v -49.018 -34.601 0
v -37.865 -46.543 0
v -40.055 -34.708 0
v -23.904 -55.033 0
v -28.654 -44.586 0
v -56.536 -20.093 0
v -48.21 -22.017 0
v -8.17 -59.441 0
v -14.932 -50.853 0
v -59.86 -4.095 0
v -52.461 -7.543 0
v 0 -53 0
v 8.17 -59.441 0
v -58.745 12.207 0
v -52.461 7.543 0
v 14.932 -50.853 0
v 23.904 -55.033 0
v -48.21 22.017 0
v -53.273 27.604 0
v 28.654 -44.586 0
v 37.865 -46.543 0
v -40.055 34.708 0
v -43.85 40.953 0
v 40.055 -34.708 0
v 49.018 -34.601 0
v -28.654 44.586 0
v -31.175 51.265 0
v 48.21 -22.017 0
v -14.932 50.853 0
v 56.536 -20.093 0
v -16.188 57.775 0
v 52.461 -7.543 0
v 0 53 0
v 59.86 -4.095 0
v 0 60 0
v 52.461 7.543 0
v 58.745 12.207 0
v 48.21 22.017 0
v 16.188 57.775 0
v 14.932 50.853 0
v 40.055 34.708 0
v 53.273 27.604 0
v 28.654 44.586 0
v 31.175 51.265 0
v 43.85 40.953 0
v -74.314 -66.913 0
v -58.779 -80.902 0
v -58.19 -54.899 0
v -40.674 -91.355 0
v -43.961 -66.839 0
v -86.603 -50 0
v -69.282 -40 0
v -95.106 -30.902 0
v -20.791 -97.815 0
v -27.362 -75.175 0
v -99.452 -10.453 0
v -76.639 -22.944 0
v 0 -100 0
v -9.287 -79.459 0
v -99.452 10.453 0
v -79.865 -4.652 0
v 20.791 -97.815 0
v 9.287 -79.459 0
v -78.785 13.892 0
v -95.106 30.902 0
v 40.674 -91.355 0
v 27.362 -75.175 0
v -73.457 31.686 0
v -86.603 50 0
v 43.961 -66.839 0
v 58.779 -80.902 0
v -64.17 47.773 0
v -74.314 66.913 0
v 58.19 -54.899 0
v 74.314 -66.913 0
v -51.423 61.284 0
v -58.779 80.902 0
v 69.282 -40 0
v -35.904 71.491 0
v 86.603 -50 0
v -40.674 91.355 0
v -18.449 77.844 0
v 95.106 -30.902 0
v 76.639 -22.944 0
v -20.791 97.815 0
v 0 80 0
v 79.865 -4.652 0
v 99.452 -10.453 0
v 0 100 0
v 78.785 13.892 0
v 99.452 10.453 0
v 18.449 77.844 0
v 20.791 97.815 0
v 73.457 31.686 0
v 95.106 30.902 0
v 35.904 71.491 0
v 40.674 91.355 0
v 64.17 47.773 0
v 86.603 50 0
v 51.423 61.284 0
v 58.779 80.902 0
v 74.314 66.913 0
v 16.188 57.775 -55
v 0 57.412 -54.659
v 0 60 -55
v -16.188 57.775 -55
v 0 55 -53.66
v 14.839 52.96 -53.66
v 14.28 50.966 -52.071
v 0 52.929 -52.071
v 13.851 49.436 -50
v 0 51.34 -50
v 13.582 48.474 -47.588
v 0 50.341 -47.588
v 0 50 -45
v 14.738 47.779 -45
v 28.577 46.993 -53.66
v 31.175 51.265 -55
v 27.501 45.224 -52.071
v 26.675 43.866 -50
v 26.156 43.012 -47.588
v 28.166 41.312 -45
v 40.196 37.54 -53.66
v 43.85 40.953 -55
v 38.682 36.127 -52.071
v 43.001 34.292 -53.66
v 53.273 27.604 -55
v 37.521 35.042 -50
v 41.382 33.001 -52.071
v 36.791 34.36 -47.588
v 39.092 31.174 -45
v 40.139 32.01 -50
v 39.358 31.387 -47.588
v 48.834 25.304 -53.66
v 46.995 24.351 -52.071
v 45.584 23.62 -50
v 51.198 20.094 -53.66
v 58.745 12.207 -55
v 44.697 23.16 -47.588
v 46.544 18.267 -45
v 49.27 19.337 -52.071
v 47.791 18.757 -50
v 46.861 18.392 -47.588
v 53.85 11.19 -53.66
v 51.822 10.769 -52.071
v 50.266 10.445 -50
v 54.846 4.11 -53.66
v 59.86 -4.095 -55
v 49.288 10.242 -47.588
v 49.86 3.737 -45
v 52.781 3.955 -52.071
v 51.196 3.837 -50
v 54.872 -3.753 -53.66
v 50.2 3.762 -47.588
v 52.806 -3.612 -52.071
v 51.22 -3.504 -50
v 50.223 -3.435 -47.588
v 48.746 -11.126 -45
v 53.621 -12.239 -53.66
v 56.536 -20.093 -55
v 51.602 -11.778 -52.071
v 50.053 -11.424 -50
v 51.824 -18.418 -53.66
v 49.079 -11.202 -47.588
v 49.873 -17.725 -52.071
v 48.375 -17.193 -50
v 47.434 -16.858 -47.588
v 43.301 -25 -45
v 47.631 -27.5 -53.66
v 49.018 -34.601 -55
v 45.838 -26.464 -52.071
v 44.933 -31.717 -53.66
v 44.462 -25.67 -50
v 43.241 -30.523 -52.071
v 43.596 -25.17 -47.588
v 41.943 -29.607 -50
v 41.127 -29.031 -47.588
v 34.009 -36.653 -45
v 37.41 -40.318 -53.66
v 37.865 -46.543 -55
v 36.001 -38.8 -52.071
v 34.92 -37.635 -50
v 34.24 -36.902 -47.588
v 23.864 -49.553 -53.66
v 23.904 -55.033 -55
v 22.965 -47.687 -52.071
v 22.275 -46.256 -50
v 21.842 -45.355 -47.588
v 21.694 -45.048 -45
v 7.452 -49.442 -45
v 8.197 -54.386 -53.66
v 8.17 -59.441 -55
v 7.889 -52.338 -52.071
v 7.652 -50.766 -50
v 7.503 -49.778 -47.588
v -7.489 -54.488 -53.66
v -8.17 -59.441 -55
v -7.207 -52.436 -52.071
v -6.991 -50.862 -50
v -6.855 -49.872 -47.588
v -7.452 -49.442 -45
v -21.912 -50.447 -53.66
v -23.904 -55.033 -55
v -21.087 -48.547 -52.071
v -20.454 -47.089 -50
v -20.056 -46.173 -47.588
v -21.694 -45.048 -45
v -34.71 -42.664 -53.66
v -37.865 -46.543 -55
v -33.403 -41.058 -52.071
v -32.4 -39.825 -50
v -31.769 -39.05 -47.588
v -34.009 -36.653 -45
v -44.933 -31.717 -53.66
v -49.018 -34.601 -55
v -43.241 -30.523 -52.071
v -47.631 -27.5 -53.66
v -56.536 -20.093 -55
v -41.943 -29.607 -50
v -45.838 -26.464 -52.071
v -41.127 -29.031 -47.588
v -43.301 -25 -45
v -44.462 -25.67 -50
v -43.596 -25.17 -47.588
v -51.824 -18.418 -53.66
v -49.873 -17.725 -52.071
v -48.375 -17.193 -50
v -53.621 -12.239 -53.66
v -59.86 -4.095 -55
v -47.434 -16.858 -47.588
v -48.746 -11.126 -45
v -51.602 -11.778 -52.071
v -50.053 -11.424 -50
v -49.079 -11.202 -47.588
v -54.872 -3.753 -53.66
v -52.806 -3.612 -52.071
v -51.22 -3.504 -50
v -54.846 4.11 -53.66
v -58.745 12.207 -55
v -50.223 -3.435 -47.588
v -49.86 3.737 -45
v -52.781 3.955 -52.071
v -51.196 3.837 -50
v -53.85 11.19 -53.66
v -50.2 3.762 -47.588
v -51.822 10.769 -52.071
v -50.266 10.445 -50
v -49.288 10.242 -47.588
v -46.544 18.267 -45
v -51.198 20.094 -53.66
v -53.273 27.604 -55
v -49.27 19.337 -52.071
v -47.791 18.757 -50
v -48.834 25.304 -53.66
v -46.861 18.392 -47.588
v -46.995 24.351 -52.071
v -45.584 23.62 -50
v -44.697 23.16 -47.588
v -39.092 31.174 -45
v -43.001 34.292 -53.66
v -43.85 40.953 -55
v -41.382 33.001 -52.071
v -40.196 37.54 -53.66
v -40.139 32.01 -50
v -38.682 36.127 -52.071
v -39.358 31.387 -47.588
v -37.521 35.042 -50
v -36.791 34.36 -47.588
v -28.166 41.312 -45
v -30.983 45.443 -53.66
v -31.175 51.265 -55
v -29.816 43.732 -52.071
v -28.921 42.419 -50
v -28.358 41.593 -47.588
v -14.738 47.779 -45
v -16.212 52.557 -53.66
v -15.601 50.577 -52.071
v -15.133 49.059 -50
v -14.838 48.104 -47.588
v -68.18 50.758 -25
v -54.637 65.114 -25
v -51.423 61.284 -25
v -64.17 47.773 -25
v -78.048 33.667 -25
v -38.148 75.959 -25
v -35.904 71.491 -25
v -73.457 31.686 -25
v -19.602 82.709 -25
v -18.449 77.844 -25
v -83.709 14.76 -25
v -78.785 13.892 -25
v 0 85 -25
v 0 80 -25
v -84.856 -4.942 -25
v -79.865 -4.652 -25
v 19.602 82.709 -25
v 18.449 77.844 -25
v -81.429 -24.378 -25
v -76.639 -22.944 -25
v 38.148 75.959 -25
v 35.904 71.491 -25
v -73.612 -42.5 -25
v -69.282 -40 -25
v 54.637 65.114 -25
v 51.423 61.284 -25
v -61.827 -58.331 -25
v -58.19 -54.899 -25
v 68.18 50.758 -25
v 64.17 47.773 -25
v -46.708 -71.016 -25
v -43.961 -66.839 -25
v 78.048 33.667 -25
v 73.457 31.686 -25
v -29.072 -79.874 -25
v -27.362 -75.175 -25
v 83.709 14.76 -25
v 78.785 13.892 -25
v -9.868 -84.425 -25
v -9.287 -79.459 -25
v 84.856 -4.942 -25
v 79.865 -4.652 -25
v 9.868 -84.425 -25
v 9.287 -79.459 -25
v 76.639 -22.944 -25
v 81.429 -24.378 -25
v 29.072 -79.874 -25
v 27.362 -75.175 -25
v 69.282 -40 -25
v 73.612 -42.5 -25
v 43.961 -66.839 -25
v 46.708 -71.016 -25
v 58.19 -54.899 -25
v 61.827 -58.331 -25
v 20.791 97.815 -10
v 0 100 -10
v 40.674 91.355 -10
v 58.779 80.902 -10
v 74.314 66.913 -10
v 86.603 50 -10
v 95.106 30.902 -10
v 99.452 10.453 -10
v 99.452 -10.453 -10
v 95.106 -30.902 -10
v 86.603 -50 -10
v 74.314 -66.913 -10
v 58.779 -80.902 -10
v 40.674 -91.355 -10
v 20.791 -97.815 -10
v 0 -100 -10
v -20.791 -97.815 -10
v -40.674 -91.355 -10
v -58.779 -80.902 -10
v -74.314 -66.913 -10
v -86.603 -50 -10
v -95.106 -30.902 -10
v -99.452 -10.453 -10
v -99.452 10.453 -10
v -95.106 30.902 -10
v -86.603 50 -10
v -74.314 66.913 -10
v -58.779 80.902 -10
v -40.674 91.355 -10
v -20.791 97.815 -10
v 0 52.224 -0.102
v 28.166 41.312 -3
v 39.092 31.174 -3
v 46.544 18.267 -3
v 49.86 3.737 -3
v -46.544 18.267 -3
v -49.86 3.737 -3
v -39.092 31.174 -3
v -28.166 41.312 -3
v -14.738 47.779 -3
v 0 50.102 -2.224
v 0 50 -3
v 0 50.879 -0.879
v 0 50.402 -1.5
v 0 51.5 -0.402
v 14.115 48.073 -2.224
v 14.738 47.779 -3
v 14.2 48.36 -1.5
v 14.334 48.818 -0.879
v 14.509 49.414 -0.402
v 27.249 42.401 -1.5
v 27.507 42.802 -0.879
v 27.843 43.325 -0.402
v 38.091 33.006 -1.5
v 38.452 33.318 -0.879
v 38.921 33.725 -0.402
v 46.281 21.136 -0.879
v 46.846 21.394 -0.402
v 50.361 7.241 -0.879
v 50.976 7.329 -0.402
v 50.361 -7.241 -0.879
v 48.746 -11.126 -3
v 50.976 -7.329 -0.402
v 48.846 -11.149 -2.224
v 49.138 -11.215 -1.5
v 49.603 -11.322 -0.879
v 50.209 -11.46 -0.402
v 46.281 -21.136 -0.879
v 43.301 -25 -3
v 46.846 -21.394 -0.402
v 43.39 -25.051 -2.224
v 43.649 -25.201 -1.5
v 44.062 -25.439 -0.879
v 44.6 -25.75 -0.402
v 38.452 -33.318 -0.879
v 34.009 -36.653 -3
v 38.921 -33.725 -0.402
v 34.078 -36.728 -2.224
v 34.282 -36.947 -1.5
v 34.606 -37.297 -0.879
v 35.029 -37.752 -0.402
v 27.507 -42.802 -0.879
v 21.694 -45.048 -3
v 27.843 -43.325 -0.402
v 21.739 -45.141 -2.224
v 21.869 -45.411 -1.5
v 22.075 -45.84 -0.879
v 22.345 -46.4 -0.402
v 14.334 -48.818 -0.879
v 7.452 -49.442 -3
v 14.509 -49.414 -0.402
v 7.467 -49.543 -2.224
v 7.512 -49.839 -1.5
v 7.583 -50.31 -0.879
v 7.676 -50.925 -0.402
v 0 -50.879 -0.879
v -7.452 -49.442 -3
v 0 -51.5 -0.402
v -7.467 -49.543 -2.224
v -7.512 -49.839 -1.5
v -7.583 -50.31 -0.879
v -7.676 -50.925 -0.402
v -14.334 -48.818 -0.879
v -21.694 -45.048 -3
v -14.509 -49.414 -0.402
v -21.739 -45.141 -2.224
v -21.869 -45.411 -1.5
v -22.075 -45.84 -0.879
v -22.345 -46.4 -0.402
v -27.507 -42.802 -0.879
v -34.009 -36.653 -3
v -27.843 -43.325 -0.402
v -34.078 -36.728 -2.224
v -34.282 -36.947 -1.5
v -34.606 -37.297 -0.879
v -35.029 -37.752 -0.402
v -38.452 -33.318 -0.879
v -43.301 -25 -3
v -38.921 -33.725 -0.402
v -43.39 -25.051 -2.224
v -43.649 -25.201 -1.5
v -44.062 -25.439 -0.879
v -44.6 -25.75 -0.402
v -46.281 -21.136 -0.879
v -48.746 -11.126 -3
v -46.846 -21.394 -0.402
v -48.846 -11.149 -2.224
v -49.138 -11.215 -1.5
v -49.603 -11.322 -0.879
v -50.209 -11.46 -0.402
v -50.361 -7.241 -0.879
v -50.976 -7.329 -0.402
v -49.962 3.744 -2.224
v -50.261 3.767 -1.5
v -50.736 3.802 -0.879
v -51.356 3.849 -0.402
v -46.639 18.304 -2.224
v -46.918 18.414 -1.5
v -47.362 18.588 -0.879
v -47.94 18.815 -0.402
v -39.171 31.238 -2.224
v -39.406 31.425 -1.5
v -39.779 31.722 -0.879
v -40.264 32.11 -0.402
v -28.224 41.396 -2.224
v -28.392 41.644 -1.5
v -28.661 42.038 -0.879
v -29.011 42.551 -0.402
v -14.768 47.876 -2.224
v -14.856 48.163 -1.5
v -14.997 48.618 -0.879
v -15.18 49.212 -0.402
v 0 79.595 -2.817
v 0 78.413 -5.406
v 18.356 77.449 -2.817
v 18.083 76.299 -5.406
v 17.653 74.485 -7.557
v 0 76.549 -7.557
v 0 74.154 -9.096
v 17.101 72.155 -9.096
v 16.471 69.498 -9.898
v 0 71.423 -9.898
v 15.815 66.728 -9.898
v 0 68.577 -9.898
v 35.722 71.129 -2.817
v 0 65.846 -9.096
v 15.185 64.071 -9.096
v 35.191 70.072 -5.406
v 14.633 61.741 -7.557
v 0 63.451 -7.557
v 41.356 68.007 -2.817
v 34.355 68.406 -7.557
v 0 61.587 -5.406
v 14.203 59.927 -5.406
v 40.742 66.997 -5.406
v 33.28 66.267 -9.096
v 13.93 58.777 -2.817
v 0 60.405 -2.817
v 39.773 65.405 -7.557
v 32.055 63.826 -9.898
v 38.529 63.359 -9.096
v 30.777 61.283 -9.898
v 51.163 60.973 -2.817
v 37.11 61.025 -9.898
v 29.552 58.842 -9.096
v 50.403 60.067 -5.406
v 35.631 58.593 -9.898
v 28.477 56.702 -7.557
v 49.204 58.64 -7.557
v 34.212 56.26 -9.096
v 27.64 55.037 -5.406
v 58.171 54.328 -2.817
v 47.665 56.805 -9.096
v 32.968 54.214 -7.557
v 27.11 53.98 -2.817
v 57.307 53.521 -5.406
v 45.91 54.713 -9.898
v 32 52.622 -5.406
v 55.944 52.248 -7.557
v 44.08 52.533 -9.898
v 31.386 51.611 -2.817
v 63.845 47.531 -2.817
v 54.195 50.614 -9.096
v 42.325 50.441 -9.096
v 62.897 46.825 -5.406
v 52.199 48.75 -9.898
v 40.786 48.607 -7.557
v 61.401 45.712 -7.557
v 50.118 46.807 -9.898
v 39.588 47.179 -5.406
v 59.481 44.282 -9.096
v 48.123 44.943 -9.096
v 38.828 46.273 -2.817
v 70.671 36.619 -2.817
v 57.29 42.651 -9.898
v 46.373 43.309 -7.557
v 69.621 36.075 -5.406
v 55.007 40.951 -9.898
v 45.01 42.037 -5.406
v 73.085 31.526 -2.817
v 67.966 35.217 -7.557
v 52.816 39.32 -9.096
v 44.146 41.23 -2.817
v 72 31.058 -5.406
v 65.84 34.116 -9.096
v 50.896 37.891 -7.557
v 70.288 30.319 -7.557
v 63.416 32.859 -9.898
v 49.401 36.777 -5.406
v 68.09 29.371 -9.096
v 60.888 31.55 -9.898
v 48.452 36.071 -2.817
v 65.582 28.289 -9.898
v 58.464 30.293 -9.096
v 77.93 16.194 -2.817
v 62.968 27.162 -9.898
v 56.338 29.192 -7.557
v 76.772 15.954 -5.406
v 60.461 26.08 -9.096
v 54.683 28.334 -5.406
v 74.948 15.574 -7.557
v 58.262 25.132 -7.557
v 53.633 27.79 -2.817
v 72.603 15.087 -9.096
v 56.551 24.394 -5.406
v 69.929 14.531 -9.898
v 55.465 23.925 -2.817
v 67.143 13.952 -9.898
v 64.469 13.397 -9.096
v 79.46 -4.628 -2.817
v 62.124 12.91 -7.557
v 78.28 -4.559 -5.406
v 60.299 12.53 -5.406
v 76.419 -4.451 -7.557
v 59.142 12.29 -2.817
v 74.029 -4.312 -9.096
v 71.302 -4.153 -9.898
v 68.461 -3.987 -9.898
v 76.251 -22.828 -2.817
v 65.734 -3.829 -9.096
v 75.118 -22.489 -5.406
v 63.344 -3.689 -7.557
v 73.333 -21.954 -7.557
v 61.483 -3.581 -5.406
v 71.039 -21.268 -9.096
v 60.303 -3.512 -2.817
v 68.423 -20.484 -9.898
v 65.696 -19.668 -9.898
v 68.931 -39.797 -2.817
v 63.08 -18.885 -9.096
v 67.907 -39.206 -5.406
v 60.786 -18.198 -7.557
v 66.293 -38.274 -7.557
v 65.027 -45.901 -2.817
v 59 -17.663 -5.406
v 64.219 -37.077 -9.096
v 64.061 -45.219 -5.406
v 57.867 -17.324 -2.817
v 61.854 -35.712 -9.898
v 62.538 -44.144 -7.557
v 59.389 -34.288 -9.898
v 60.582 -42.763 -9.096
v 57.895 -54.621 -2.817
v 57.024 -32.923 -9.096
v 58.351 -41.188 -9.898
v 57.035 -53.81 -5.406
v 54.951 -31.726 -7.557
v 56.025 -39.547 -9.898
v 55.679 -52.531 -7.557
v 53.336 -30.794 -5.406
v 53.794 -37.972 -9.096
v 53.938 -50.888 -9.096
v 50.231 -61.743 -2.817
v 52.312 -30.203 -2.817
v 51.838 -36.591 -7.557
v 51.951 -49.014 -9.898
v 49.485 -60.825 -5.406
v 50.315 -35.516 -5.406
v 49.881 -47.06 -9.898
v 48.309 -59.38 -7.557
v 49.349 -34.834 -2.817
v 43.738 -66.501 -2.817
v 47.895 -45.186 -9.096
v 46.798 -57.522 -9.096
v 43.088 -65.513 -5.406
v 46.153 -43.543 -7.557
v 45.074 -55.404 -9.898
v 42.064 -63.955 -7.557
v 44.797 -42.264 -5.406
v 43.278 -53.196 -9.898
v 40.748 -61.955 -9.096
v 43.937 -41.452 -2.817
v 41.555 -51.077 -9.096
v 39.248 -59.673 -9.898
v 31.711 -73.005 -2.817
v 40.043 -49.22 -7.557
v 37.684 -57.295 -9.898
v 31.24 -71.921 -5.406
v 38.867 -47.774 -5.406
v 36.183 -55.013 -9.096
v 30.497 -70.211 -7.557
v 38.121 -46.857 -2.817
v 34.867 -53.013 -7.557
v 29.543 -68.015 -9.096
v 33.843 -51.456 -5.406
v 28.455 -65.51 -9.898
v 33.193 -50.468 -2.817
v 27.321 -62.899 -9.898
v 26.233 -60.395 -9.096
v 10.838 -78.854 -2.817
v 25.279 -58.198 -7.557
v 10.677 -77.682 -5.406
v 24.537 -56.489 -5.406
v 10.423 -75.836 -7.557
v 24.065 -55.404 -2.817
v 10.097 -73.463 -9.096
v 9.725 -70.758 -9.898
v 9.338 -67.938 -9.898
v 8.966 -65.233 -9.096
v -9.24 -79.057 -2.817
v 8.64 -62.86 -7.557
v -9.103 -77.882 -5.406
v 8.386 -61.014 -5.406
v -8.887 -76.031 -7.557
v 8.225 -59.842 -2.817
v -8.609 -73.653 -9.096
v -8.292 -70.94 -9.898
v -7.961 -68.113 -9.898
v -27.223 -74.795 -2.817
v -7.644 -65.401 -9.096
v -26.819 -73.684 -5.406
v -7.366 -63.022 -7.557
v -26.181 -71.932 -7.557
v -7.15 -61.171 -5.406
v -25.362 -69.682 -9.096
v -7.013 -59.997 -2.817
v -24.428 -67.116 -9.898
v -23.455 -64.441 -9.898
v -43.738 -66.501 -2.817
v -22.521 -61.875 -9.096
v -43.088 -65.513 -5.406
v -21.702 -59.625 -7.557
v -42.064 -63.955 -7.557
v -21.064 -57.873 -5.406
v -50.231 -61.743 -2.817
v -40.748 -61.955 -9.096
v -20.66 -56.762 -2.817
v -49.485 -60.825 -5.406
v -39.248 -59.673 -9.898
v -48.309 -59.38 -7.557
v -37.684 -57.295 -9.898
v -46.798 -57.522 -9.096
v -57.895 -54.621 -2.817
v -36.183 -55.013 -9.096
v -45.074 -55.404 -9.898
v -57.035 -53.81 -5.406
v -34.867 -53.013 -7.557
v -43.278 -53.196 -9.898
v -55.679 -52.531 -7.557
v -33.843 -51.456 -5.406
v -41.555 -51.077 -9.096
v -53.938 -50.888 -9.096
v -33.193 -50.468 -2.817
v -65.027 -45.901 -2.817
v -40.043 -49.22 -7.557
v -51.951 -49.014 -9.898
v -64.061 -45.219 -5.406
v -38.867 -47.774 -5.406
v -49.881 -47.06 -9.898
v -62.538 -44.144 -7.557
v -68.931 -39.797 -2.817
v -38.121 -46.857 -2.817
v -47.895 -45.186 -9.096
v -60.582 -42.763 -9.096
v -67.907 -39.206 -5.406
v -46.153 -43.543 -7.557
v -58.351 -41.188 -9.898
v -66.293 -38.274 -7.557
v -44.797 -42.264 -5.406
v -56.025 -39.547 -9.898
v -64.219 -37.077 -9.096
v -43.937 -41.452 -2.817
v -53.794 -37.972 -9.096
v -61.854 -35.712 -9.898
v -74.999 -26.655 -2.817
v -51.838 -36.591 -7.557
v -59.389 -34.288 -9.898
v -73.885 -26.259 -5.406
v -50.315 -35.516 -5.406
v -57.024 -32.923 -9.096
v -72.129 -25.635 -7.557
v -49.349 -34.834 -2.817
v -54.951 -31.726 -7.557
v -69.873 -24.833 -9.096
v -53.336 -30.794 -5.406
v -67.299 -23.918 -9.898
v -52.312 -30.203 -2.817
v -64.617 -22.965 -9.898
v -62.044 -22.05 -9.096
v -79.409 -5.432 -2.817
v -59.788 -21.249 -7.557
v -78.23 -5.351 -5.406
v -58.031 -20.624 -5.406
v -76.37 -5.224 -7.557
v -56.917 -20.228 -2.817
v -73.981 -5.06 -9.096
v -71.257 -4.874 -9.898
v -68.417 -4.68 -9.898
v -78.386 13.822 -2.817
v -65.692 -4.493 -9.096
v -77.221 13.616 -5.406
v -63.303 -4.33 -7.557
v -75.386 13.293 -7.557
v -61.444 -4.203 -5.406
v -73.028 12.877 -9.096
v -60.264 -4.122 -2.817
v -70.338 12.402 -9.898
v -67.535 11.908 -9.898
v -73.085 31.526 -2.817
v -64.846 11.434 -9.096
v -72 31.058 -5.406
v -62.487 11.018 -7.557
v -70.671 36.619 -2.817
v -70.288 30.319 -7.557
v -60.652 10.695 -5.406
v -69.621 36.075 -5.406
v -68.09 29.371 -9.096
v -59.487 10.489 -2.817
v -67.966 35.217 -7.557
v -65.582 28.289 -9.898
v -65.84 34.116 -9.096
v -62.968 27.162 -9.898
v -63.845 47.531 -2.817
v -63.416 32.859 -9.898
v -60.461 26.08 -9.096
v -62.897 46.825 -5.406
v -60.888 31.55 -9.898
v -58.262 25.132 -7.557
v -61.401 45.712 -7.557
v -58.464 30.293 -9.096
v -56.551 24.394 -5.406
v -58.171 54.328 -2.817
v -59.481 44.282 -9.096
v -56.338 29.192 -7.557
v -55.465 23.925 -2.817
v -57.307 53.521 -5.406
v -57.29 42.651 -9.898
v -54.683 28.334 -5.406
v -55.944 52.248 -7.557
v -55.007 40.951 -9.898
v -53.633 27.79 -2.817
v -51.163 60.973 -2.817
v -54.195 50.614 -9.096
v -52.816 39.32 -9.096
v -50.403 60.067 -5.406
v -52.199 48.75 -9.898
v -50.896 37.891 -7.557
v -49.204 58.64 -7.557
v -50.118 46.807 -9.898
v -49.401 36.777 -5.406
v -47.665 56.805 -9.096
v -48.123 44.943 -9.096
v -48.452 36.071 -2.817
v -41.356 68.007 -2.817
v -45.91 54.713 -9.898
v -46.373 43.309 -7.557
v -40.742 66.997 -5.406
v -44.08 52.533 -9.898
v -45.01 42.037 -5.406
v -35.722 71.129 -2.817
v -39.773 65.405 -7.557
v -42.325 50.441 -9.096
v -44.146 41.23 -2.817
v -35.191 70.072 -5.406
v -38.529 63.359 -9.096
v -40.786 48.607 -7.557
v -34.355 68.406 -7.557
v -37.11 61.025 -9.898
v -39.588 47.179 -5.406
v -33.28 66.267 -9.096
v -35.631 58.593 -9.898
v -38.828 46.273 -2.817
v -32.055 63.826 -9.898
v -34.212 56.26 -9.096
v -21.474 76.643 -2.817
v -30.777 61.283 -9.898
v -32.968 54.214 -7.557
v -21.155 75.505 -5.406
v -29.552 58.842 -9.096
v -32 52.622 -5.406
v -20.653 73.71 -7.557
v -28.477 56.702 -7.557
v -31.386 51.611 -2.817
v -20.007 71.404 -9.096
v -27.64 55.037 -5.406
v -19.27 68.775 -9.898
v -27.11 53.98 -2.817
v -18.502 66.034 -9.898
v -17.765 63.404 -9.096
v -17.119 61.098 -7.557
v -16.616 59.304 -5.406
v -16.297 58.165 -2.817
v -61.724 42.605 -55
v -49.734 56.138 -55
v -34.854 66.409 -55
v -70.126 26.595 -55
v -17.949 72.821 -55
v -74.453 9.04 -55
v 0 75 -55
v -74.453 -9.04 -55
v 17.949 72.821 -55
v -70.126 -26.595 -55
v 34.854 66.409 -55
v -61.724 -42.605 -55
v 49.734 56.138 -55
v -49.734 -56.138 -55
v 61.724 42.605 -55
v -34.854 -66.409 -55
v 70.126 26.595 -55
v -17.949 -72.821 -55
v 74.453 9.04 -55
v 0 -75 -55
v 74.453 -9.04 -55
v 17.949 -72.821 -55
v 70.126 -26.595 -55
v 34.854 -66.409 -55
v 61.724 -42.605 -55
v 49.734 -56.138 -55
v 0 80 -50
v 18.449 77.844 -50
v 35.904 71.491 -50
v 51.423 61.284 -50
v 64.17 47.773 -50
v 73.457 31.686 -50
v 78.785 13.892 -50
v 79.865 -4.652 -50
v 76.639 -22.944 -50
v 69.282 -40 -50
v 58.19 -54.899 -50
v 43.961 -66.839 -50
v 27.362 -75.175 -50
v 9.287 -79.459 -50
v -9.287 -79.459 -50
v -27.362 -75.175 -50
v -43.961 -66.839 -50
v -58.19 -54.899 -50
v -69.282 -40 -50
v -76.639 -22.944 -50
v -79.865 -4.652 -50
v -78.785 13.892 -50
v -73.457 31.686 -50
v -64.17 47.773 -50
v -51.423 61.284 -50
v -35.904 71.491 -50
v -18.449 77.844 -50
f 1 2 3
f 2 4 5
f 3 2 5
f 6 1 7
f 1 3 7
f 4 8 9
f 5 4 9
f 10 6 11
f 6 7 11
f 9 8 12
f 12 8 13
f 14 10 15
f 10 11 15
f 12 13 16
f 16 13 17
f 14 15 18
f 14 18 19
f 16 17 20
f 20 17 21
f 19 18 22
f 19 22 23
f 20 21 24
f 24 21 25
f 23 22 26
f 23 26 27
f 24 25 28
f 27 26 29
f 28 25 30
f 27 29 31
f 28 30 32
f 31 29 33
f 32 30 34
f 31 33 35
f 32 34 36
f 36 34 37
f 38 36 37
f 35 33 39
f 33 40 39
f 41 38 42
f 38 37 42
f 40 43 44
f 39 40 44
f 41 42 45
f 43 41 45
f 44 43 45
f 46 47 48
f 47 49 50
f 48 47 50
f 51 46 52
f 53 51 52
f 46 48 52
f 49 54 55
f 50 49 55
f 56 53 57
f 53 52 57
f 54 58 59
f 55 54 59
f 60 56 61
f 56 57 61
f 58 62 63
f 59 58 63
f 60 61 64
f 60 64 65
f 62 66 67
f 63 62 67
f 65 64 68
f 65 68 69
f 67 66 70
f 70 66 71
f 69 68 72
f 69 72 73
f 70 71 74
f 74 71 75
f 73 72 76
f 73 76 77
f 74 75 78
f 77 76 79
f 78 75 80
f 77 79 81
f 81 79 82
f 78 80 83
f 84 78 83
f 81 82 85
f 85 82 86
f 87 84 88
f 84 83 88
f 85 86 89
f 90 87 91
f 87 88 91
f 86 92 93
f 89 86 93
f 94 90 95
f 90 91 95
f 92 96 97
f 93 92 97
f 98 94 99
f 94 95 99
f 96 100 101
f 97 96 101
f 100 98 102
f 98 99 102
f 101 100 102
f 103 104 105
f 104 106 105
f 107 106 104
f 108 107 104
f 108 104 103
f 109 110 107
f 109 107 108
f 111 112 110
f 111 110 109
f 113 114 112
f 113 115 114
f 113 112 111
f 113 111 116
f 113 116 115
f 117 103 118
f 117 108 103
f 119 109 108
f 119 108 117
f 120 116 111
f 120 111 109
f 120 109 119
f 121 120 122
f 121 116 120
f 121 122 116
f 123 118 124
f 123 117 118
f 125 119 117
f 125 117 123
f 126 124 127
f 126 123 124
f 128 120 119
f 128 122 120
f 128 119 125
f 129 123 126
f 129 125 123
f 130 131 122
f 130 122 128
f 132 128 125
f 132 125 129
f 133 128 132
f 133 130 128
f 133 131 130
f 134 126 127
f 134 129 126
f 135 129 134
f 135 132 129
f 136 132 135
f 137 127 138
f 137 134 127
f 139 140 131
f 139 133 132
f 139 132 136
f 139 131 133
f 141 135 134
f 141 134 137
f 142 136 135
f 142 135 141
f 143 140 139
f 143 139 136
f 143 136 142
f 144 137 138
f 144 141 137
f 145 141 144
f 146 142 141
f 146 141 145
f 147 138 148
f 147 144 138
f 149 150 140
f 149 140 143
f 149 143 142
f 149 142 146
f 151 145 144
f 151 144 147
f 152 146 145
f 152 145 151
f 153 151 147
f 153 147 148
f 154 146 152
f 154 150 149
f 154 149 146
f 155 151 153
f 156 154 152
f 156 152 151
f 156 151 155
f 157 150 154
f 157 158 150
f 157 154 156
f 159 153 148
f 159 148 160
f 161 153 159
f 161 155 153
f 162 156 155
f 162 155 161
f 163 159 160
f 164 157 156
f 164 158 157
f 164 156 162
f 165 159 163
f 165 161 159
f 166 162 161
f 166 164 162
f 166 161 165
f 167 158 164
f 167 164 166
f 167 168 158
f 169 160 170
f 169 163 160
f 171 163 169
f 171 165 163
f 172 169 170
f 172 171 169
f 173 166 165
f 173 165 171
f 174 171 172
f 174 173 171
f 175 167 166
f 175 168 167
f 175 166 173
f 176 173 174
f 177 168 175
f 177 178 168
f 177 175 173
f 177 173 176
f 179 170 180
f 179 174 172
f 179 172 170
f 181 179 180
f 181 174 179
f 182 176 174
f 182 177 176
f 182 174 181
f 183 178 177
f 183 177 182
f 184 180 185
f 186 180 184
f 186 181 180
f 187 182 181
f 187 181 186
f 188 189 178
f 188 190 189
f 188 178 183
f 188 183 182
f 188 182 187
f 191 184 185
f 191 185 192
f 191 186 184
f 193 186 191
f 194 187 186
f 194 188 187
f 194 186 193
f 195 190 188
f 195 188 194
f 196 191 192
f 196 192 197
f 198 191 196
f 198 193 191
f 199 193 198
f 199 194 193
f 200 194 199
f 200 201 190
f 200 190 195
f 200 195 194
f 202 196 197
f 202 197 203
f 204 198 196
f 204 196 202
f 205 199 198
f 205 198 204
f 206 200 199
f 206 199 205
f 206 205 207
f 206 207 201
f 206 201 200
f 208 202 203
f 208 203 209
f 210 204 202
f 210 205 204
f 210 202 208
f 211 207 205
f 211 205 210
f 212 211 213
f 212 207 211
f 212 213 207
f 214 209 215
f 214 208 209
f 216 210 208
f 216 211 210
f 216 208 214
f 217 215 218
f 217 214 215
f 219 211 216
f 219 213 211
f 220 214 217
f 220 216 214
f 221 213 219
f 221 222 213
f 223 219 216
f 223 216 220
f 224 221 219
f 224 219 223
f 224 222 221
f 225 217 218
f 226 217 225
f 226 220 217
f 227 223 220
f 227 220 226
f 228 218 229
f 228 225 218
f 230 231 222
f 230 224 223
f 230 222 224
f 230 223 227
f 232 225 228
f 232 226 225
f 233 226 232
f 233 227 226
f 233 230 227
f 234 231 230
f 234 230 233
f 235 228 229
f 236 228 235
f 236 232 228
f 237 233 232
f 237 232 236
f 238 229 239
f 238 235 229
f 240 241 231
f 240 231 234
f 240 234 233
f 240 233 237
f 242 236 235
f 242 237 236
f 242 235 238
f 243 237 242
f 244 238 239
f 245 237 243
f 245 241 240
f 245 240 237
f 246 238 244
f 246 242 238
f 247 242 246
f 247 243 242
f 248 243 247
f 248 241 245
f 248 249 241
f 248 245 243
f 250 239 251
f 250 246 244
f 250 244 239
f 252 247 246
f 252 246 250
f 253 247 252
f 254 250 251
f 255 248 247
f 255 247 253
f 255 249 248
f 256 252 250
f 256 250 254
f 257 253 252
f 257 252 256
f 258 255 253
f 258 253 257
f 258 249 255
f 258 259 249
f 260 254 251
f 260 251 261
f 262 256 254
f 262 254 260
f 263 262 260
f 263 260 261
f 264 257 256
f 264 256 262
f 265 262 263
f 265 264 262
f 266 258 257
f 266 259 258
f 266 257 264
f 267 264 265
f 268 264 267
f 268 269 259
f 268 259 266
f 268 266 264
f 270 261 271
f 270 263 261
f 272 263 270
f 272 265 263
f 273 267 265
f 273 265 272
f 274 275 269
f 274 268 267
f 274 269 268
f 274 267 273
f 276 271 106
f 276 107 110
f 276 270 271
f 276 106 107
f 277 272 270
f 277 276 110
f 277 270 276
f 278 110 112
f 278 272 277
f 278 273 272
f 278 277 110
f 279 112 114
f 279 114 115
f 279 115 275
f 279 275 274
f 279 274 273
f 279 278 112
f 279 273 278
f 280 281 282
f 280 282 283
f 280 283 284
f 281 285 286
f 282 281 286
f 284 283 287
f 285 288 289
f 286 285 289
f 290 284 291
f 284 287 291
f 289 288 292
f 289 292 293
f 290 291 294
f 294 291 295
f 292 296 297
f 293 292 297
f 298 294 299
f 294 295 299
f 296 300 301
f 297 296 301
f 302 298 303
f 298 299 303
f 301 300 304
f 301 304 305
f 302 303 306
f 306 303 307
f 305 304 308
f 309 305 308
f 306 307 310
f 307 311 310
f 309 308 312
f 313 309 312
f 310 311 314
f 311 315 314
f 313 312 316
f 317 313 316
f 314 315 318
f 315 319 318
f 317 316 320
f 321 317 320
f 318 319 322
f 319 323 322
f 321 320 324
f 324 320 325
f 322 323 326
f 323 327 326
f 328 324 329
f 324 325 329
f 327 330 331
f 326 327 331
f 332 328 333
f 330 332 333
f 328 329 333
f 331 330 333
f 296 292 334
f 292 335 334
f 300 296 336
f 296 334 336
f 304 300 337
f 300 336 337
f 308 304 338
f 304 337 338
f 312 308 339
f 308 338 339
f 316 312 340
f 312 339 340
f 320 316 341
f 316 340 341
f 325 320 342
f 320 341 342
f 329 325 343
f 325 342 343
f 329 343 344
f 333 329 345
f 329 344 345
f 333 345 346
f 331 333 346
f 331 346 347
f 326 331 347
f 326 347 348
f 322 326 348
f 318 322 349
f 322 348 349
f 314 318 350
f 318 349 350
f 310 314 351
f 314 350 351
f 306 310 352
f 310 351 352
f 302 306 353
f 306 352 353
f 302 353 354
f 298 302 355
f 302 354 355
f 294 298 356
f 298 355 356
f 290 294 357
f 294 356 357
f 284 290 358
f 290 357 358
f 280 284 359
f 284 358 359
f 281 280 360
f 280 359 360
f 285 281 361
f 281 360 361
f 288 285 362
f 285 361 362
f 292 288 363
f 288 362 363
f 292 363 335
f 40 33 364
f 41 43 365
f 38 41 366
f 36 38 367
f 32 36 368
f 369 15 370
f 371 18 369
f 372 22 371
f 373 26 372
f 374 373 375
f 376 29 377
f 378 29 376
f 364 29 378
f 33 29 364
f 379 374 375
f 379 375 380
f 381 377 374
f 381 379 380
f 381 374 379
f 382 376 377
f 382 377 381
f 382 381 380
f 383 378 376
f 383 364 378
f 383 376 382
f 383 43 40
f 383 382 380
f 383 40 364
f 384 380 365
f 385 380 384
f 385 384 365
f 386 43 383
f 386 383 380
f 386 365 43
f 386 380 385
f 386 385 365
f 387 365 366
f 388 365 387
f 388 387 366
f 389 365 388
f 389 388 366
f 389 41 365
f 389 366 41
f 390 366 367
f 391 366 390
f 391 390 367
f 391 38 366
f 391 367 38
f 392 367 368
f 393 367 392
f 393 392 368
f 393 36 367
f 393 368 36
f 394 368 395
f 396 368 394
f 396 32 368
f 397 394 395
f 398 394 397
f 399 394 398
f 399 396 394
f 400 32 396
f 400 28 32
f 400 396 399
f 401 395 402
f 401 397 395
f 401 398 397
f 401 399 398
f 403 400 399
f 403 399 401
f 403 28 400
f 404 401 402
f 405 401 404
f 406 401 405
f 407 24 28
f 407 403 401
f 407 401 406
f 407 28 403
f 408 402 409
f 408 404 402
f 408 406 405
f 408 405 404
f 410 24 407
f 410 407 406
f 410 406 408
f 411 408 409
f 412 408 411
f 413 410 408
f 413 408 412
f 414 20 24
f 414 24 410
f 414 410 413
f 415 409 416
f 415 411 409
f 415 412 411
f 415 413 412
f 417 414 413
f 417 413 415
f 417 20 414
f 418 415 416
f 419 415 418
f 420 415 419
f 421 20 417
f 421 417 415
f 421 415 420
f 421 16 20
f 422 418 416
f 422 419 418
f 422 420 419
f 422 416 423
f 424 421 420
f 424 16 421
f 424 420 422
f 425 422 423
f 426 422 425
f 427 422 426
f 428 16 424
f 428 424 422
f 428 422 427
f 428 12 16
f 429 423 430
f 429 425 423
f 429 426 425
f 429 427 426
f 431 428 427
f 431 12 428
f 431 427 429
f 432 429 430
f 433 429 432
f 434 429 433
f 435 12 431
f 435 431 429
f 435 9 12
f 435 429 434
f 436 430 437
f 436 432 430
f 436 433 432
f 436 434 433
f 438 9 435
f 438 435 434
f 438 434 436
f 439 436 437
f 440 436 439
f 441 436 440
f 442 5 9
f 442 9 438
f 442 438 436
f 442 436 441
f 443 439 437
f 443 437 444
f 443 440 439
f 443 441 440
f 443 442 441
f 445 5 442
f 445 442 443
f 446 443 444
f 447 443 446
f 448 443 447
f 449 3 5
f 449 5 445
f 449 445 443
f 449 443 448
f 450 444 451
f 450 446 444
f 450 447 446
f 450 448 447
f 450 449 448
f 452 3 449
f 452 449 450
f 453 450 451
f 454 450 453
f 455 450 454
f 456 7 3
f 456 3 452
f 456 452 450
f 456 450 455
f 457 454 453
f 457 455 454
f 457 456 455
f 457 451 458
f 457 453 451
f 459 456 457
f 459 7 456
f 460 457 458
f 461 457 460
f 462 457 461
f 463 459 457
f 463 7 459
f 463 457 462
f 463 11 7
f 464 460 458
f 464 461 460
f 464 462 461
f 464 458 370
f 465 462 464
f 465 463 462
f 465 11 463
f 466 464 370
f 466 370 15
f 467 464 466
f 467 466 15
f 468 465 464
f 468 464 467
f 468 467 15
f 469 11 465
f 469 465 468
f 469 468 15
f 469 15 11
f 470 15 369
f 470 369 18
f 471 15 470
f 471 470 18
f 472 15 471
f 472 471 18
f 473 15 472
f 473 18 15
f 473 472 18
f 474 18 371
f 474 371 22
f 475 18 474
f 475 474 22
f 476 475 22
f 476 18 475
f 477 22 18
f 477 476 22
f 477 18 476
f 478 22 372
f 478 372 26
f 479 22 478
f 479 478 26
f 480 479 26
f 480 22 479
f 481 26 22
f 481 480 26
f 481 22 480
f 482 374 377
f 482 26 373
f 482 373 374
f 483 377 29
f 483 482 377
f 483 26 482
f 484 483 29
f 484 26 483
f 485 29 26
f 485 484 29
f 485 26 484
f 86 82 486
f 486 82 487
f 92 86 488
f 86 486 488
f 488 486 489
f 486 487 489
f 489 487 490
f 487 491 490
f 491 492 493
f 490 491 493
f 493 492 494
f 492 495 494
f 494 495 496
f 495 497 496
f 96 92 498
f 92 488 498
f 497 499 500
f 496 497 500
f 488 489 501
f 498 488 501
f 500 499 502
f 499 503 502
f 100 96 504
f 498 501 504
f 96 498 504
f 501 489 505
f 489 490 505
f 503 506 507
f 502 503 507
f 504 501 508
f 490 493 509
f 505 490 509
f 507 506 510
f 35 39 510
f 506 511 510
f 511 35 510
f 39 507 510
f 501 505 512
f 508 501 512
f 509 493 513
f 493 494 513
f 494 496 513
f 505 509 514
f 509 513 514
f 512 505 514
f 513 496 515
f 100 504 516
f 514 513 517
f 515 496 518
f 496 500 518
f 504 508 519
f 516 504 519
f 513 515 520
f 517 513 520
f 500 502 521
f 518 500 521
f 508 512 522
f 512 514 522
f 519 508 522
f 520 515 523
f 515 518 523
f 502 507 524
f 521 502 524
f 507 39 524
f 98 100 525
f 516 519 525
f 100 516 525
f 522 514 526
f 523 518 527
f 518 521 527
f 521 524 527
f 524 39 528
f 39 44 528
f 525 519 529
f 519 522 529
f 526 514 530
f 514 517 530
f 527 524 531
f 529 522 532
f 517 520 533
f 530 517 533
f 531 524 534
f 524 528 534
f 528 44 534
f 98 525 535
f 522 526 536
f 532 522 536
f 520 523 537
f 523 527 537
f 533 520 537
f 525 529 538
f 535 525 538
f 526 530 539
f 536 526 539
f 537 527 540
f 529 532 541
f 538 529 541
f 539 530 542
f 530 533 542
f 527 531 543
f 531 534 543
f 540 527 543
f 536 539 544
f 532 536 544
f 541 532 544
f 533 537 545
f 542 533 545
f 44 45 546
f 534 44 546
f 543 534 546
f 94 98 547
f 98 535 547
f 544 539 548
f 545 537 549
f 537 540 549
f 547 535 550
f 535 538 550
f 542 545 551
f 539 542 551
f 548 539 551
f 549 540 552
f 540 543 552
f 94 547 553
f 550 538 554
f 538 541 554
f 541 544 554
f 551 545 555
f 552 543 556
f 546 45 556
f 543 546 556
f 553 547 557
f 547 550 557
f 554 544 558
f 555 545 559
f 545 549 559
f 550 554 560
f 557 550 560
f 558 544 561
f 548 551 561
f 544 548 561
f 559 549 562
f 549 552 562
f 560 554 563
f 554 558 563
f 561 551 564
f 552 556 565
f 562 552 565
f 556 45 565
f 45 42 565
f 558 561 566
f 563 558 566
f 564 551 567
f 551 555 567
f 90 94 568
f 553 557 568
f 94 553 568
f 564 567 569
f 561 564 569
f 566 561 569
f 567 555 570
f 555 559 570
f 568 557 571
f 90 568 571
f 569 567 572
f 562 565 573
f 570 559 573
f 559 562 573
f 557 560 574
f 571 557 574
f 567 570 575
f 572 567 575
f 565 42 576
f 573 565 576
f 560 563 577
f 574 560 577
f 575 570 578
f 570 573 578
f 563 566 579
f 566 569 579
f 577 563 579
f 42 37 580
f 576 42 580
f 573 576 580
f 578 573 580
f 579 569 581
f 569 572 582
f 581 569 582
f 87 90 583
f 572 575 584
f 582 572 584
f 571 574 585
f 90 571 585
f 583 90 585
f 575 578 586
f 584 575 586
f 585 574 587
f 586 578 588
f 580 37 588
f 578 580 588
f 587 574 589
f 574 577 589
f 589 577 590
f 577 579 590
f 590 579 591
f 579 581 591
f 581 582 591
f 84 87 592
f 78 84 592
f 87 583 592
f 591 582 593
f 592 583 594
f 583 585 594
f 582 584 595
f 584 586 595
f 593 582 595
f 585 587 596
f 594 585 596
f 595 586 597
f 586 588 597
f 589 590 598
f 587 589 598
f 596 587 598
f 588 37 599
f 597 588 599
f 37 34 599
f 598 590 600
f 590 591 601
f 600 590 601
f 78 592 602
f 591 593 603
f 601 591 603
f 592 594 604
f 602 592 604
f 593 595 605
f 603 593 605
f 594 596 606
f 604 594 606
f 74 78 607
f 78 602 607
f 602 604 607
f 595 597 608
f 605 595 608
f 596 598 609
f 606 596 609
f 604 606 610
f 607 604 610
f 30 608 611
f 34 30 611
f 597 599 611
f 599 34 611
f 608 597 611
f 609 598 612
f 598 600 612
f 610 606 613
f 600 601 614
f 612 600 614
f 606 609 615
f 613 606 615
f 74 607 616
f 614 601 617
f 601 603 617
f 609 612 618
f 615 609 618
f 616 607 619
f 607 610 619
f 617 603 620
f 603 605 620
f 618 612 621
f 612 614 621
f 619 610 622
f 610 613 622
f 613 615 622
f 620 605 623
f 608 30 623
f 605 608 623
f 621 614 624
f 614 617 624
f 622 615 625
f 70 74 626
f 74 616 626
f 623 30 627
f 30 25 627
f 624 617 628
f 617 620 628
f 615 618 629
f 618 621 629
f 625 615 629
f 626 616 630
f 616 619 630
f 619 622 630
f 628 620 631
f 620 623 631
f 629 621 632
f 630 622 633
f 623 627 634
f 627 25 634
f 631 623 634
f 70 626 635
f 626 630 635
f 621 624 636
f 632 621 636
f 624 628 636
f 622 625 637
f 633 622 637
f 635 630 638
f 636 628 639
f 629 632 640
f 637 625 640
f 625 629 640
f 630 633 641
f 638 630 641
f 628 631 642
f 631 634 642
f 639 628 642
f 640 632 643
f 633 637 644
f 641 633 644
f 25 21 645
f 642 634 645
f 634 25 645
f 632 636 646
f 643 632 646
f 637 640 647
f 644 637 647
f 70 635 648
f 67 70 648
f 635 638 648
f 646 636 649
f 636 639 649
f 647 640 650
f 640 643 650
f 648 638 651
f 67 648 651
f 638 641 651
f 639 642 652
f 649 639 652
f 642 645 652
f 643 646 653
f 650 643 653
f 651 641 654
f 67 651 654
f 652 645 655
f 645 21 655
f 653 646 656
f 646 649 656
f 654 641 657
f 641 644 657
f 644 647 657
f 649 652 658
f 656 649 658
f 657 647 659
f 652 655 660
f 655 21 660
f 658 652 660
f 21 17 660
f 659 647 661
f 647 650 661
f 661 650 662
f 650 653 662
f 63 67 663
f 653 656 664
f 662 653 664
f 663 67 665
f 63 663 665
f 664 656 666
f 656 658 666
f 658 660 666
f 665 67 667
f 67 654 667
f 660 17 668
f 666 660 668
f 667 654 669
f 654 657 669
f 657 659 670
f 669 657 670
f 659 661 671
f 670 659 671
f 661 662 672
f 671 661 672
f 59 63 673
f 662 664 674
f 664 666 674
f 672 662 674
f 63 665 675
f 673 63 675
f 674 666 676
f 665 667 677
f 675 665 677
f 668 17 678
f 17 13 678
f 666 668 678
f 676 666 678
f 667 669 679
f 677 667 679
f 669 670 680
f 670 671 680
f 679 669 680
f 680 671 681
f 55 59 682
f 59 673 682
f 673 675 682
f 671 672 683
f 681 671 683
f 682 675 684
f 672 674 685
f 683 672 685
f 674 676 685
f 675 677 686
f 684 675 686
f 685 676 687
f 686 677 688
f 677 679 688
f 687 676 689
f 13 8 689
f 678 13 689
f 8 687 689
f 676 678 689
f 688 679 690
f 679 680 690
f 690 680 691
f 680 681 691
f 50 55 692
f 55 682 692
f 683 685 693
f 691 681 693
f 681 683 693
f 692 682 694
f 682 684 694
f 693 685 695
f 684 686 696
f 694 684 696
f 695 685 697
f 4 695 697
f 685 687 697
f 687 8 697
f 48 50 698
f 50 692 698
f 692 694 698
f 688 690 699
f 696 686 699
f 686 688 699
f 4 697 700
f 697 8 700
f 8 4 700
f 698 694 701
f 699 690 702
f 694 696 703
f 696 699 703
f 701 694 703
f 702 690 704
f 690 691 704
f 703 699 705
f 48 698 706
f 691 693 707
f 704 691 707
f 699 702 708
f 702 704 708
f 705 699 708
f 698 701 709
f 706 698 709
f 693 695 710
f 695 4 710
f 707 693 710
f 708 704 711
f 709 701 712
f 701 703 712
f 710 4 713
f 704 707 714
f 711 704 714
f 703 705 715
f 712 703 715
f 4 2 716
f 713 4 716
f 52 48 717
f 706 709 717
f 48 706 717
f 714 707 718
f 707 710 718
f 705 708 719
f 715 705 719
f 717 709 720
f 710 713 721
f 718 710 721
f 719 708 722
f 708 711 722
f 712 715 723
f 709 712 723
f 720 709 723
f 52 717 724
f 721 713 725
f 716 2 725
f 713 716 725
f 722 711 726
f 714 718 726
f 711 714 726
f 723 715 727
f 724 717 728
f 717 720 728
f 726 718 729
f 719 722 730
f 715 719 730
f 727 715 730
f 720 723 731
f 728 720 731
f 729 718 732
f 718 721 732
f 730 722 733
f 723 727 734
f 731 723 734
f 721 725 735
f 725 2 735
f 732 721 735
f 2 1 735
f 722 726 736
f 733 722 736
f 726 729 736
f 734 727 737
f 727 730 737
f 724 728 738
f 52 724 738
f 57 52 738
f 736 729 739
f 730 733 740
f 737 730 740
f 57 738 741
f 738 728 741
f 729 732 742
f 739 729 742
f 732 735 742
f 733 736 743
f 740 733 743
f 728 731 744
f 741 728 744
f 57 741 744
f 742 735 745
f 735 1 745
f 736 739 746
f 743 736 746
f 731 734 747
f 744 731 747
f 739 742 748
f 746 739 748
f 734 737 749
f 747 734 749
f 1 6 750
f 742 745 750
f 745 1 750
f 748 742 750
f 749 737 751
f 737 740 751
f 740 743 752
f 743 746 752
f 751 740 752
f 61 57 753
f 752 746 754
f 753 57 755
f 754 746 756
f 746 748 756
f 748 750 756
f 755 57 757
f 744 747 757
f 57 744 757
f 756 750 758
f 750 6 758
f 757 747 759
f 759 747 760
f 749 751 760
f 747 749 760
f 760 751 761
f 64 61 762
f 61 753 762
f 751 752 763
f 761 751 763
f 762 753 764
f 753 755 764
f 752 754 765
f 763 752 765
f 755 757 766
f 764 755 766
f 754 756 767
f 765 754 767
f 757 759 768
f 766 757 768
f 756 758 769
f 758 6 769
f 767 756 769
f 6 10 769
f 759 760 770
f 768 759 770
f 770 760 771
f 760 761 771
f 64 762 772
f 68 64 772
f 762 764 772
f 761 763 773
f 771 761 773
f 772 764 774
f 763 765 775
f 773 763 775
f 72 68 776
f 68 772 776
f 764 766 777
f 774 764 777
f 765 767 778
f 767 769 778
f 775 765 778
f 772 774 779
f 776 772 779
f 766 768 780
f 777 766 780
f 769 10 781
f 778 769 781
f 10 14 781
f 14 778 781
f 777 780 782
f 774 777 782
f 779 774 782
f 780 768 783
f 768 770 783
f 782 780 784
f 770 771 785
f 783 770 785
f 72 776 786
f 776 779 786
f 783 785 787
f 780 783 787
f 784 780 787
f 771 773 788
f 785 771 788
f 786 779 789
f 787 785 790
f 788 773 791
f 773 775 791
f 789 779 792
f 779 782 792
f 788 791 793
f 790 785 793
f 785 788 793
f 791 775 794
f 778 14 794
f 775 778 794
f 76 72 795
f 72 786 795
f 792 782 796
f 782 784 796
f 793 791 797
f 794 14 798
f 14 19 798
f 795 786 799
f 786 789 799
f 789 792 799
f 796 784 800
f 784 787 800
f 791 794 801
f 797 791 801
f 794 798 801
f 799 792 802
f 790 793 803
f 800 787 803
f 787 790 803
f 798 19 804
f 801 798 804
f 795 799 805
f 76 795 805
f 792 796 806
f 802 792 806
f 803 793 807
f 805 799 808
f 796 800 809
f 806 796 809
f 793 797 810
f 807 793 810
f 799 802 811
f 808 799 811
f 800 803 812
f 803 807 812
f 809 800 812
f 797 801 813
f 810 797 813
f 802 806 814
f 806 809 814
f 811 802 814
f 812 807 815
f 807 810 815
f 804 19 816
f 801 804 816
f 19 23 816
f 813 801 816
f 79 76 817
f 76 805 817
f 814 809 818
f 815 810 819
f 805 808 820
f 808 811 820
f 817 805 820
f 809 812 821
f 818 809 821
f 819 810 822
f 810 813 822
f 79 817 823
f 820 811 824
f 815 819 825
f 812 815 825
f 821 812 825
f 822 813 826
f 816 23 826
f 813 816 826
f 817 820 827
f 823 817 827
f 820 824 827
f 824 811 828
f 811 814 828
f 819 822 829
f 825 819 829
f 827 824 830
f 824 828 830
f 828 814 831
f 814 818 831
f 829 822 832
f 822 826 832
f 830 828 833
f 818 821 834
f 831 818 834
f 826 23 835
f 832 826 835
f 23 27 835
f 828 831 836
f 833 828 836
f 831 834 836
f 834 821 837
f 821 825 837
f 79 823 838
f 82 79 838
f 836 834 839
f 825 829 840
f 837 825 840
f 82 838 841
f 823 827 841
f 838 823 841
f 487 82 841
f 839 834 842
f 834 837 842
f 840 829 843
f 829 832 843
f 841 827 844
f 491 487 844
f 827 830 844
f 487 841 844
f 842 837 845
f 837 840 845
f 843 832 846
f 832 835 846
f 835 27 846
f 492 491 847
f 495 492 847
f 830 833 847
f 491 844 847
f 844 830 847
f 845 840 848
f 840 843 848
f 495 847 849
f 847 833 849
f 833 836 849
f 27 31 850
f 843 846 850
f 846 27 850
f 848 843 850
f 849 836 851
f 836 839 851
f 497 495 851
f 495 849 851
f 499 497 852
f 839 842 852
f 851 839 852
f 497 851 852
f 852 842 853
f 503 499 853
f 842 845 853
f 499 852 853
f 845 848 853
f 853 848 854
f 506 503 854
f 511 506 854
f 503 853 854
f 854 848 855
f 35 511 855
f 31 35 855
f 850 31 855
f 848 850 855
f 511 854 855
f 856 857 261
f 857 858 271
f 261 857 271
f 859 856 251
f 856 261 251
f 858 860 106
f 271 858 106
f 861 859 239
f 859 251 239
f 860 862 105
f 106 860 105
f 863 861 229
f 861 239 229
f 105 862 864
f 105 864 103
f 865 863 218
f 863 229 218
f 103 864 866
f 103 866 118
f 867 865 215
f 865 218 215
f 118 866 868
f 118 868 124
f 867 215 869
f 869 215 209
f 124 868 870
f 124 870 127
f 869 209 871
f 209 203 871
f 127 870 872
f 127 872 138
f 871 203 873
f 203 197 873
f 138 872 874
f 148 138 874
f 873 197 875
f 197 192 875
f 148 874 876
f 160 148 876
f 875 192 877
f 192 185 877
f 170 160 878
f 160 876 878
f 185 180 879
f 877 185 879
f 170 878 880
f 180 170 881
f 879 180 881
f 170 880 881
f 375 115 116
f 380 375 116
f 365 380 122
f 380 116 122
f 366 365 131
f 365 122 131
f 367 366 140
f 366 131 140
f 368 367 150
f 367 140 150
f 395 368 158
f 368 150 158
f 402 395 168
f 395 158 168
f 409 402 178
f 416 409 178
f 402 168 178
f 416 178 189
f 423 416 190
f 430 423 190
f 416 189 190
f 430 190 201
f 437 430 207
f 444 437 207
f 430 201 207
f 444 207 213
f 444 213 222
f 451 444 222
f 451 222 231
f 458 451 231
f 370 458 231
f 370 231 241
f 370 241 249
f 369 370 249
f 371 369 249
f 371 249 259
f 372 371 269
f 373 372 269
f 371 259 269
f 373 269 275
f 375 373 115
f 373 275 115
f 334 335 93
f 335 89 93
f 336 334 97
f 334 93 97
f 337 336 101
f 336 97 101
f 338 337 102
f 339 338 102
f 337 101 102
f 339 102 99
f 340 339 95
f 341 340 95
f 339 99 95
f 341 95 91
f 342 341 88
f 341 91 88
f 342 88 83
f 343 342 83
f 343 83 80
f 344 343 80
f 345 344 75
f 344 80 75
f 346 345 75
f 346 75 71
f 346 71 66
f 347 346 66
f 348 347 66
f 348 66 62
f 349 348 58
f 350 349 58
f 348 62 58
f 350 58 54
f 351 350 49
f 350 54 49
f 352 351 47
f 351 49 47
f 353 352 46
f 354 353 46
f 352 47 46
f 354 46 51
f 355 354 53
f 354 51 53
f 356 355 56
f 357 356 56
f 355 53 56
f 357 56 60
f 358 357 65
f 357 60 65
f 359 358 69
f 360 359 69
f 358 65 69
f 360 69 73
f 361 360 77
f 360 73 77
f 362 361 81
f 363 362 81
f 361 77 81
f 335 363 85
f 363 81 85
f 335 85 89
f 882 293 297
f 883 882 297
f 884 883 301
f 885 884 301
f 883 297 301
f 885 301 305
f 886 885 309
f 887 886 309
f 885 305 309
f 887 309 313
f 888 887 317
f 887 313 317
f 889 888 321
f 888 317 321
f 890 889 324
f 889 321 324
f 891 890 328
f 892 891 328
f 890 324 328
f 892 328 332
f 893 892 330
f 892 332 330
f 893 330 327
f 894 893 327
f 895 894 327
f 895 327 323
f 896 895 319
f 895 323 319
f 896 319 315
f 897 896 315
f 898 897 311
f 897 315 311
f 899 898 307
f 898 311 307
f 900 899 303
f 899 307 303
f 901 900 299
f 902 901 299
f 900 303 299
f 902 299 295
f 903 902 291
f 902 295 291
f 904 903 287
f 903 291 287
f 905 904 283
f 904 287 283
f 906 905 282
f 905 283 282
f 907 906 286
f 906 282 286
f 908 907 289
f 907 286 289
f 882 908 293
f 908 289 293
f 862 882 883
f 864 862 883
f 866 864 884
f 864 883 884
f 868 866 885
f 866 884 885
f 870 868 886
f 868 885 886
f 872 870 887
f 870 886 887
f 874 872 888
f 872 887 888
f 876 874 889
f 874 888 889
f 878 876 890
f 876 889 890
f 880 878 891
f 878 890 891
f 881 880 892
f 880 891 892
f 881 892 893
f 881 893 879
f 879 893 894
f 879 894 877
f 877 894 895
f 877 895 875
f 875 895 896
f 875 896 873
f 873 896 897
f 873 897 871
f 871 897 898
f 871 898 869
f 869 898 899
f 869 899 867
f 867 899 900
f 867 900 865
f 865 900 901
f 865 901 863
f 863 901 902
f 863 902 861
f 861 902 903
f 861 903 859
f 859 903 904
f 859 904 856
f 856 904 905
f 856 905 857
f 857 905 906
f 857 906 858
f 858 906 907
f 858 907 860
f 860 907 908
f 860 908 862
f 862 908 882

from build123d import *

# Parameters (mm, degrees)
F2_SIZE = 5
F3_R    = 10
F4_R    = 3


with BuildPart() as f1:
    # F0 (on Right) → F1 (revolve)
    with BuildSketch(Plane.YZ):
        with BuildLine():
            Line((60, 0), (50, 0))
            Line((50, 0), (50, -55))
            Line((50, -55), (80, -55))
            Line((80, -55), (80, -25))
            Line((80, -25), (85, -25))
            Line((85, -25), (100, -10))
            Line((100, -10), (100, 0))
            Line((100, 0), (80, 0))
            ThreePointArc((80, 0), (70, -10), (60, 0))
        make_face()
    revolve(axis=Axis((0, 0, -46.653546), (0, 0, -1)))

    # F2
    f2_edges = [f1.edges().sort_by_distance(p)[0] for p in [
        (0, -80, -55),
    ]]
    chamfer(f2_edges, length=F2_SIZE)

    # F3
    f3_edges = [f1.edges().sort_by_distance(p)[0] for p in [
        (0, -50, -55),
    ]]
    fillet(f3_edges, radius=F3_R)

    # F4
    f4_edges = [f1.edges().sort_by_distance(p)[0] for p in [
        (0, -50, 0),
    ]]
    fillet(f4_edges, radius=F4_R)


solid = f1.part
